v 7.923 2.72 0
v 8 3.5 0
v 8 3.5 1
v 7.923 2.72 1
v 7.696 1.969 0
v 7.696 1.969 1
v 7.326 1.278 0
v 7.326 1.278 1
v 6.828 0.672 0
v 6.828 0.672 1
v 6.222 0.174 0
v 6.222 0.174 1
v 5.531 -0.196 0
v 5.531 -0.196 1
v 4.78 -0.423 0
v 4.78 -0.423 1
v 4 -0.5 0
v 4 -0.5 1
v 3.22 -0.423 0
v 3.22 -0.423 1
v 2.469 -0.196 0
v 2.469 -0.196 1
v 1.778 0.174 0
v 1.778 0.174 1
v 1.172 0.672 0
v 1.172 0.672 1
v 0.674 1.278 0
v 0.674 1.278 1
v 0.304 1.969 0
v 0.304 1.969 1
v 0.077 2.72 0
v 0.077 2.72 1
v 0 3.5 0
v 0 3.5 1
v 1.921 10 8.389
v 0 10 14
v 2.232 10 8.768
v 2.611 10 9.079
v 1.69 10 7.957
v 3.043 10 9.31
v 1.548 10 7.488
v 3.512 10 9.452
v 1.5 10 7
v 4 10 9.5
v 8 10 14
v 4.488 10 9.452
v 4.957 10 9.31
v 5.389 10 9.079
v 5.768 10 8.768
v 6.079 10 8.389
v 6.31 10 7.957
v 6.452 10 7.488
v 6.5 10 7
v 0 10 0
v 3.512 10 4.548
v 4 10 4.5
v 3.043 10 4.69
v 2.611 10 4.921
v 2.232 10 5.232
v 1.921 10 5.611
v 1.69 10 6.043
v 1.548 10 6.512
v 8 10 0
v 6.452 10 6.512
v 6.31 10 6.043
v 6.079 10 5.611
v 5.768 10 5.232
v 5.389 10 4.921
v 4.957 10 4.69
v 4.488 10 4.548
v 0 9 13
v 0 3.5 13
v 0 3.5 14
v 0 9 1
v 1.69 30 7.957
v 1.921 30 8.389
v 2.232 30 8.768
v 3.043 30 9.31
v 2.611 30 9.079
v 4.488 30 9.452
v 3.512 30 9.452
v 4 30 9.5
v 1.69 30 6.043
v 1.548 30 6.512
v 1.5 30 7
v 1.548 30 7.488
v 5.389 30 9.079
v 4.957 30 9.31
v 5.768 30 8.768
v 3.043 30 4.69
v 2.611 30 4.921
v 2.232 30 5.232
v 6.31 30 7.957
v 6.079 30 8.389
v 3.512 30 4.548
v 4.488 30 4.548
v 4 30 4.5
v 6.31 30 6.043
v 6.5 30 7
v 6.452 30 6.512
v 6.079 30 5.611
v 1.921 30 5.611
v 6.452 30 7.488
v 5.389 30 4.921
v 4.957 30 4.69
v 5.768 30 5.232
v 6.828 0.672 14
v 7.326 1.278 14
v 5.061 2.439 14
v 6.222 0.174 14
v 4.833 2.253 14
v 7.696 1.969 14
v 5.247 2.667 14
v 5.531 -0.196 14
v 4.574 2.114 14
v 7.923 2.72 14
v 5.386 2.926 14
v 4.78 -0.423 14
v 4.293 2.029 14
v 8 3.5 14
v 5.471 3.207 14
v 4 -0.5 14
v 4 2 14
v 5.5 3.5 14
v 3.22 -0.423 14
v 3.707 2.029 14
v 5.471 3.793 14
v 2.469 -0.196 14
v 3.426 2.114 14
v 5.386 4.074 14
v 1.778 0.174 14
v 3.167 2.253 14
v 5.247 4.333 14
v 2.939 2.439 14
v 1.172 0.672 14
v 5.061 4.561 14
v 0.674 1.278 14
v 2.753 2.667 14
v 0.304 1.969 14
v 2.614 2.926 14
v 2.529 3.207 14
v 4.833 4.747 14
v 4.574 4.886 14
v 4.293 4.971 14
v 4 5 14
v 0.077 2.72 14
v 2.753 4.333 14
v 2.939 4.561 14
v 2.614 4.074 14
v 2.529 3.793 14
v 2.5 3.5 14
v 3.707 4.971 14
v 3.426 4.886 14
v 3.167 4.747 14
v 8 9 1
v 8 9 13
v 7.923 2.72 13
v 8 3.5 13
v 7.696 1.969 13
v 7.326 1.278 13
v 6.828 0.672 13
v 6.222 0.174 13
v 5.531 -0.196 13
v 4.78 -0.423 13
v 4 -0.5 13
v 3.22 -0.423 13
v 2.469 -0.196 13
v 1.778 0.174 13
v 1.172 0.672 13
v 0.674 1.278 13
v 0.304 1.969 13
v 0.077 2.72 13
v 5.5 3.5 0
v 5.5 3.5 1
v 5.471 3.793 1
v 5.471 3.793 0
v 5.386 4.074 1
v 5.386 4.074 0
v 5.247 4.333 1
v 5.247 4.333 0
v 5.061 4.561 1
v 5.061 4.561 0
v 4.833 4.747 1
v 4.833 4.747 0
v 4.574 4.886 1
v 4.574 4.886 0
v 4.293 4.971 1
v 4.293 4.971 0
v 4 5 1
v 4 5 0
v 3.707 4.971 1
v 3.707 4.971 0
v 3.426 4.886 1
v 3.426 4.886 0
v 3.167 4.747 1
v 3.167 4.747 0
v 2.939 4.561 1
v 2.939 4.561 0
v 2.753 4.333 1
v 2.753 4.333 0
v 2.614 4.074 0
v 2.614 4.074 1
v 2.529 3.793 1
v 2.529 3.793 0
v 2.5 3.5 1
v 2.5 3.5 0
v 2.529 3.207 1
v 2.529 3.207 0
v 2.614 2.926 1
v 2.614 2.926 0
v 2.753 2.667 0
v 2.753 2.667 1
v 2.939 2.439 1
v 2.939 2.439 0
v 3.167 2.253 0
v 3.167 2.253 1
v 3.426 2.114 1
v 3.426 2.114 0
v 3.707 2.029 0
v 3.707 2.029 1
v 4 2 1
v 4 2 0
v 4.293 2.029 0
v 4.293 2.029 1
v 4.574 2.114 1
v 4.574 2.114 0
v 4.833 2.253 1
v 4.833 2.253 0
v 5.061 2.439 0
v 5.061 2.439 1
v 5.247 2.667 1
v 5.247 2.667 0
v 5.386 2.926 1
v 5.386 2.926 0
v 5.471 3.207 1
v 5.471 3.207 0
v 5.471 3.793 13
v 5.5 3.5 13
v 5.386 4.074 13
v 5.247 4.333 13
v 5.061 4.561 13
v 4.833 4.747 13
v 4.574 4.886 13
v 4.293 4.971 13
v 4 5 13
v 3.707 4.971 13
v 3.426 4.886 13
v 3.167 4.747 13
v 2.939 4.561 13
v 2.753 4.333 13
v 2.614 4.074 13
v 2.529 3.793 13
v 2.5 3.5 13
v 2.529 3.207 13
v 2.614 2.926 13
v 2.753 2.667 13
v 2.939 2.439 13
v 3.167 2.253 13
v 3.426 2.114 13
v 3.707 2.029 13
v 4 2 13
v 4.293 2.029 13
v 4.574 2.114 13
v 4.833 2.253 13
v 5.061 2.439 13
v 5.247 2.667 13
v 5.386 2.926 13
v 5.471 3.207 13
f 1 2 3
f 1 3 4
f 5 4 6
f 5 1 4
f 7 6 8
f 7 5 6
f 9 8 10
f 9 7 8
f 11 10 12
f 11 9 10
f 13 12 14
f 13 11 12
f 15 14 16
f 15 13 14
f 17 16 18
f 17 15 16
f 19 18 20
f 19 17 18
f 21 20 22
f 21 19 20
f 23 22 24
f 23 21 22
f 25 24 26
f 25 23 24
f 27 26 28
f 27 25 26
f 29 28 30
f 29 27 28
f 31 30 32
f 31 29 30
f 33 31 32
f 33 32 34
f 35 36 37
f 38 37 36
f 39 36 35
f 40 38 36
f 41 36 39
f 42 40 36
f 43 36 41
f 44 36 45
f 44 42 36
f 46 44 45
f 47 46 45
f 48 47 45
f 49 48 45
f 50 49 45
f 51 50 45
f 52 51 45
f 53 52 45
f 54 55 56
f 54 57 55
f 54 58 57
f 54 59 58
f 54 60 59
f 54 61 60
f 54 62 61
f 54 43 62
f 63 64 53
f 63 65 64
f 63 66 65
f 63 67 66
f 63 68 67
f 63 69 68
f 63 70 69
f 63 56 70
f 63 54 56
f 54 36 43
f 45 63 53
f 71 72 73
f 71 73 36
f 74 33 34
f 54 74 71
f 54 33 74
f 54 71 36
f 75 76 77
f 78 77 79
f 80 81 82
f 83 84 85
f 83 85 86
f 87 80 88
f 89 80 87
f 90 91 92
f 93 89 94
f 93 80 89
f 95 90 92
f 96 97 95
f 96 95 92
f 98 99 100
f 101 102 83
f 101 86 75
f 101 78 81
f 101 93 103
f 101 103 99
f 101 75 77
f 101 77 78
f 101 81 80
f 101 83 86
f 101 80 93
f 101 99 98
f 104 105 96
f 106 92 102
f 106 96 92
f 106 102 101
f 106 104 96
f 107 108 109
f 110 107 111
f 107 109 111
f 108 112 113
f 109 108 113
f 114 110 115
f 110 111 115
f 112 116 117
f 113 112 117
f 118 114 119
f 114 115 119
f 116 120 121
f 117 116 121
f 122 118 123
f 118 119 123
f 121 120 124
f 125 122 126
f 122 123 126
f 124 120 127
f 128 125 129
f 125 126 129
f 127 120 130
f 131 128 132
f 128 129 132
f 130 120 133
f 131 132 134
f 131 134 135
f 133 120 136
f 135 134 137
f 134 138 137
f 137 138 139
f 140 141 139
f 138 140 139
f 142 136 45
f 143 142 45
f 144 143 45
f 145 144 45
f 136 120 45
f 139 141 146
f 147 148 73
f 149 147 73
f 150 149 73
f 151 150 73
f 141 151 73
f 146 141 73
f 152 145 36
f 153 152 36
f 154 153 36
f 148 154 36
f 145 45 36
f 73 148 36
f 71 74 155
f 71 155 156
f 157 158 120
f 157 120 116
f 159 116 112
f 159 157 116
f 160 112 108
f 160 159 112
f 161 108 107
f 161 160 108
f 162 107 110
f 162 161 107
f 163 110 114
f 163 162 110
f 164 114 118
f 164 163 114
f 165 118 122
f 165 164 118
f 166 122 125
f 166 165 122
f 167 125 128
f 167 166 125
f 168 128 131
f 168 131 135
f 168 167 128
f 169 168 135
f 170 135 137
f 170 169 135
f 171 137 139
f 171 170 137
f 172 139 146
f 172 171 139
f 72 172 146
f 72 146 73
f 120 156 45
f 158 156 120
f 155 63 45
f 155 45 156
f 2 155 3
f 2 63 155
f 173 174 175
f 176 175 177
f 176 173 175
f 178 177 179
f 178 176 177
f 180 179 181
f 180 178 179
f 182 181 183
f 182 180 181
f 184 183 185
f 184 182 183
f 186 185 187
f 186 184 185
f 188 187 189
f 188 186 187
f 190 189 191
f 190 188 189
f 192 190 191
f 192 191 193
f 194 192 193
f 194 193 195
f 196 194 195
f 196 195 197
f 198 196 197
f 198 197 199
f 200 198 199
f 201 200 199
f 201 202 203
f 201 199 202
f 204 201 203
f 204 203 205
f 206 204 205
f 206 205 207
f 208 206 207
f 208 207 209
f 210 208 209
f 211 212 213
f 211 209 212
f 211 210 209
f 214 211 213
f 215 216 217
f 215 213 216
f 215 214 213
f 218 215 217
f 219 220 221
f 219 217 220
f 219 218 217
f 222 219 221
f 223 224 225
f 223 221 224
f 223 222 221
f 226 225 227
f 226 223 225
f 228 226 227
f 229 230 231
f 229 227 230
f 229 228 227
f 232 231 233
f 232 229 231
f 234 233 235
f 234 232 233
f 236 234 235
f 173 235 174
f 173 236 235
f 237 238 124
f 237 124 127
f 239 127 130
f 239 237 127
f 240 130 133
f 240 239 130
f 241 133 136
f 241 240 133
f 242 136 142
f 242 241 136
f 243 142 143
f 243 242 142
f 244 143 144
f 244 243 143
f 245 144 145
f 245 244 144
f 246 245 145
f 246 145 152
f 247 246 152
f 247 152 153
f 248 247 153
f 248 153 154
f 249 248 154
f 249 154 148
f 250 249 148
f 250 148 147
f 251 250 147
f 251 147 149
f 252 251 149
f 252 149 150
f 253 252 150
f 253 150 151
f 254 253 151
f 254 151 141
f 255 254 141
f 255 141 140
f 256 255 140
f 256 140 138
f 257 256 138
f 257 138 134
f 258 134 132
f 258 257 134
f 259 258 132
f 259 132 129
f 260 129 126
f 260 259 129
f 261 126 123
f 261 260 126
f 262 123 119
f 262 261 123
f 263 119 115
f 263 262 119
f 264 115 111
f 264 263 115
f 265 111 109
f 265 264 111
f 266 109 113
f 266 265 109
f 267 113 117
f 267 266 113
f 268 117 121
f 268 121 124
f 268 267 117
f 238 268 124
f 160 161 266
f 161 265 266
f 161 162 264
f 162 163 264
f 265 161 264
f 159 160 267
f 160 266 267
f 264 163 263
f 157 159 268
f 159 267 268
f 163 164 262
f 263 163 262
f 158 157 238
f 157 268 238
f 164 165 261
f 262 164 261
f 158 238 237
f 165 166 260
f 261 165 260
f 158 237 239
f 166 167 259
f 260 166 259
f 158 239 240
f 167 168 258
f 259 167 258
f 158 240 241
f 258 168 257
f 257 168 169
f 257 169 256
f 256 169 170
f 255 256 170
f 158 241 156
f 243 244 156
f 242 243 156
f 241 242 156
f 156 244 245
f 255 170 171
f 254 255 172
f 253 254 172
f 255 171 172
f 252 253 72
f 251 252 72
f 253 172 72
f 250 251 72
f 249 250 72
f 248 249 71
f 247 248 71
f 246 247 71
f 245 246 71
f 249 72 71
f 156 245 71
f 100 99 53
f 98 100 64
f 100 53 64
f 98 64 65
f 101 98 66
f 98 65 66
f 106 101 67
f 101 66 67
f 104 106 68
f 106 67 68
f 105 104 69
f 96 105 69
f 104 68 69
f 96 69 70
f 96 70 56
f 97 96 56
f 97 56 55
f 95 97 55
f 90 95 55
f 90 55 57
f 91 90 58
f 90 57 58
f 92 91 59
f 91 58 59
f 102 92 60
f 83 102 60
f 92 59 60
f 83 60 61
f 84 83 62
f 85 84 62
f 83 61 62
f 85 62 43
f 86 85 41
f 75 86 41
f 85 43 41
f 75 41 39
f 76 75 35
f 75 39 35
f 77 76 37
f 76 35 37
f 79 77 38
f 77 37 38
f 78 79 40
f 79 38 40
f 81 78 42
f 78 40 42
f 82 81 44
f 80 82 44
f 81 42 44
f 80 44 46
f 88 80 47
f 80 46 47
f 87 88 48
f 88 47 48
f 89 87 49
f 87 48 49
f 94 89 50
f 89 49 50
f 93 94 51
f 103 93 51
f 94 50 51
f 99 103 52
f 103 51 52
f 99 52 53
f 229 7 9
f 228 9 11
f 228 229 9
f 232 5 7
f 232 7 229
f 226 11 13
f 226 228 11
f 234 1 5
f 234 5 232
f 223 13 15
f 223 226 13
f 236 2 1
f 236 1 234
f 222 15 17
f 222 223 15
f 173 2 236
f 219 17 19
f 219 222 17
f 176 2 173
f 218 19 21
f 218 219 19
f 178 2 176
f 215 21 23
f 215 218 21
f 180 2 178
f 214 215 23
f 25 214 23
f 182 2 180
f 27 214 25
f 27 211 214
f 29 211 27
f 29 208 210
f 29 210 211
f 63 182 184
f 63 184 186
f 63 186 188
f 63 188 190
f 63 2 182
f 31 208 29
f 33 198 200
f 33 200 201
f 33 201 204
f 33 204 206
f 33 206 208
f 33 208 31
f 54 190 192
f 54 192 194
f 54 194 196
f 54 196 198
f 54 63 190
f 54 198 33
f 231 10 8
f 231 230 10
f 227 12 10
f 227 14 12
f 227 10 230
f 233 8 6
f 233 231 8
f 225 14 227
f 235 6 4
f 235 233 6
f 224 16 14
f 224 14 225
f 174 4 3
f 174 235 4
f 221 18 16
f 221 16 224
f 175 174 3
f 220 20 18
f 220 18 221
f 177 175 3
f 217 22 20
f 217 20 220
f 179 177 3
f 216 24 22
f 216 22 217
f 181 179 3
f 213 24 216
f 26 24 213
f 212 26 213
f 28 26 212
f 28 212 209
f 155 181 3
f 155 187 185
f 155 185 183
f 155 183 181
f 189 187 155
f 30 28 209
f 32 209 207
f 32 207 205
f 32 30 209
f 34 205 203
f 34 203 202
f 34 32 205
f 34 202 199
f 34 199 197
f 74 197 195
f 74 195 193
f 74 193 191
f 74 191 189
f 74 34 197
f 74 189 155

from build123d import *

# Parameters (mm, degrees)
ESQUISSE1_R      = 1.5
EXTRUSION1_DEPTH = 14
ESQUISSE2_R      = 2.5
EXTRUSION2_DEPTH = 20
ESQUISSE5_W      = 12
ESQUISSE5_H      = 9.78359792
EXTRUSION4_DEPTH = 20


with BuildPart() as part:
    # Esquisse1 → Extrusion1 (new body)
    with BuildSketch(Plane.XY):
        with BuildLine():
            Line((0, 3.5), (0, 10))
            Line((0, 10), (8, 10))
            Line((8, 10), (8, 3.5))
            ThreePointArc((8, 3.5), (4, -0.5), (0, 3.5))
        make_face()
        with Locations((4, 3.5)):
            Circle(ESQUISSE1_R, mode=Mode.SUBTRACT)
    extrude(amount=EXTRUSION1_DEPTH)

    # Esquisse2 → Extrusion2 (add)
    with BuildSketch(Plane(origin=(0, 10, 0), x_dir=(1, 0, 0), z_dir=(0, 1, 0))):
        with Locations((4, -7)):
            Circle(ESQUISSE2_R)
    extrude(amount=EXTRUSION2_DEPTH)

    # Esquisse5 → Extrusion4 (cut)
    with BuildSketch(Plane.ZY):
        with Locations((7, 4.10820104)):
            Rectangle(ESQUISSE5_W, ESQUISSE5_H)
    extrude(amount=-EXTRUSION4_DEPTH, mode=Mode.SUBTRACT)


solid = part.part
